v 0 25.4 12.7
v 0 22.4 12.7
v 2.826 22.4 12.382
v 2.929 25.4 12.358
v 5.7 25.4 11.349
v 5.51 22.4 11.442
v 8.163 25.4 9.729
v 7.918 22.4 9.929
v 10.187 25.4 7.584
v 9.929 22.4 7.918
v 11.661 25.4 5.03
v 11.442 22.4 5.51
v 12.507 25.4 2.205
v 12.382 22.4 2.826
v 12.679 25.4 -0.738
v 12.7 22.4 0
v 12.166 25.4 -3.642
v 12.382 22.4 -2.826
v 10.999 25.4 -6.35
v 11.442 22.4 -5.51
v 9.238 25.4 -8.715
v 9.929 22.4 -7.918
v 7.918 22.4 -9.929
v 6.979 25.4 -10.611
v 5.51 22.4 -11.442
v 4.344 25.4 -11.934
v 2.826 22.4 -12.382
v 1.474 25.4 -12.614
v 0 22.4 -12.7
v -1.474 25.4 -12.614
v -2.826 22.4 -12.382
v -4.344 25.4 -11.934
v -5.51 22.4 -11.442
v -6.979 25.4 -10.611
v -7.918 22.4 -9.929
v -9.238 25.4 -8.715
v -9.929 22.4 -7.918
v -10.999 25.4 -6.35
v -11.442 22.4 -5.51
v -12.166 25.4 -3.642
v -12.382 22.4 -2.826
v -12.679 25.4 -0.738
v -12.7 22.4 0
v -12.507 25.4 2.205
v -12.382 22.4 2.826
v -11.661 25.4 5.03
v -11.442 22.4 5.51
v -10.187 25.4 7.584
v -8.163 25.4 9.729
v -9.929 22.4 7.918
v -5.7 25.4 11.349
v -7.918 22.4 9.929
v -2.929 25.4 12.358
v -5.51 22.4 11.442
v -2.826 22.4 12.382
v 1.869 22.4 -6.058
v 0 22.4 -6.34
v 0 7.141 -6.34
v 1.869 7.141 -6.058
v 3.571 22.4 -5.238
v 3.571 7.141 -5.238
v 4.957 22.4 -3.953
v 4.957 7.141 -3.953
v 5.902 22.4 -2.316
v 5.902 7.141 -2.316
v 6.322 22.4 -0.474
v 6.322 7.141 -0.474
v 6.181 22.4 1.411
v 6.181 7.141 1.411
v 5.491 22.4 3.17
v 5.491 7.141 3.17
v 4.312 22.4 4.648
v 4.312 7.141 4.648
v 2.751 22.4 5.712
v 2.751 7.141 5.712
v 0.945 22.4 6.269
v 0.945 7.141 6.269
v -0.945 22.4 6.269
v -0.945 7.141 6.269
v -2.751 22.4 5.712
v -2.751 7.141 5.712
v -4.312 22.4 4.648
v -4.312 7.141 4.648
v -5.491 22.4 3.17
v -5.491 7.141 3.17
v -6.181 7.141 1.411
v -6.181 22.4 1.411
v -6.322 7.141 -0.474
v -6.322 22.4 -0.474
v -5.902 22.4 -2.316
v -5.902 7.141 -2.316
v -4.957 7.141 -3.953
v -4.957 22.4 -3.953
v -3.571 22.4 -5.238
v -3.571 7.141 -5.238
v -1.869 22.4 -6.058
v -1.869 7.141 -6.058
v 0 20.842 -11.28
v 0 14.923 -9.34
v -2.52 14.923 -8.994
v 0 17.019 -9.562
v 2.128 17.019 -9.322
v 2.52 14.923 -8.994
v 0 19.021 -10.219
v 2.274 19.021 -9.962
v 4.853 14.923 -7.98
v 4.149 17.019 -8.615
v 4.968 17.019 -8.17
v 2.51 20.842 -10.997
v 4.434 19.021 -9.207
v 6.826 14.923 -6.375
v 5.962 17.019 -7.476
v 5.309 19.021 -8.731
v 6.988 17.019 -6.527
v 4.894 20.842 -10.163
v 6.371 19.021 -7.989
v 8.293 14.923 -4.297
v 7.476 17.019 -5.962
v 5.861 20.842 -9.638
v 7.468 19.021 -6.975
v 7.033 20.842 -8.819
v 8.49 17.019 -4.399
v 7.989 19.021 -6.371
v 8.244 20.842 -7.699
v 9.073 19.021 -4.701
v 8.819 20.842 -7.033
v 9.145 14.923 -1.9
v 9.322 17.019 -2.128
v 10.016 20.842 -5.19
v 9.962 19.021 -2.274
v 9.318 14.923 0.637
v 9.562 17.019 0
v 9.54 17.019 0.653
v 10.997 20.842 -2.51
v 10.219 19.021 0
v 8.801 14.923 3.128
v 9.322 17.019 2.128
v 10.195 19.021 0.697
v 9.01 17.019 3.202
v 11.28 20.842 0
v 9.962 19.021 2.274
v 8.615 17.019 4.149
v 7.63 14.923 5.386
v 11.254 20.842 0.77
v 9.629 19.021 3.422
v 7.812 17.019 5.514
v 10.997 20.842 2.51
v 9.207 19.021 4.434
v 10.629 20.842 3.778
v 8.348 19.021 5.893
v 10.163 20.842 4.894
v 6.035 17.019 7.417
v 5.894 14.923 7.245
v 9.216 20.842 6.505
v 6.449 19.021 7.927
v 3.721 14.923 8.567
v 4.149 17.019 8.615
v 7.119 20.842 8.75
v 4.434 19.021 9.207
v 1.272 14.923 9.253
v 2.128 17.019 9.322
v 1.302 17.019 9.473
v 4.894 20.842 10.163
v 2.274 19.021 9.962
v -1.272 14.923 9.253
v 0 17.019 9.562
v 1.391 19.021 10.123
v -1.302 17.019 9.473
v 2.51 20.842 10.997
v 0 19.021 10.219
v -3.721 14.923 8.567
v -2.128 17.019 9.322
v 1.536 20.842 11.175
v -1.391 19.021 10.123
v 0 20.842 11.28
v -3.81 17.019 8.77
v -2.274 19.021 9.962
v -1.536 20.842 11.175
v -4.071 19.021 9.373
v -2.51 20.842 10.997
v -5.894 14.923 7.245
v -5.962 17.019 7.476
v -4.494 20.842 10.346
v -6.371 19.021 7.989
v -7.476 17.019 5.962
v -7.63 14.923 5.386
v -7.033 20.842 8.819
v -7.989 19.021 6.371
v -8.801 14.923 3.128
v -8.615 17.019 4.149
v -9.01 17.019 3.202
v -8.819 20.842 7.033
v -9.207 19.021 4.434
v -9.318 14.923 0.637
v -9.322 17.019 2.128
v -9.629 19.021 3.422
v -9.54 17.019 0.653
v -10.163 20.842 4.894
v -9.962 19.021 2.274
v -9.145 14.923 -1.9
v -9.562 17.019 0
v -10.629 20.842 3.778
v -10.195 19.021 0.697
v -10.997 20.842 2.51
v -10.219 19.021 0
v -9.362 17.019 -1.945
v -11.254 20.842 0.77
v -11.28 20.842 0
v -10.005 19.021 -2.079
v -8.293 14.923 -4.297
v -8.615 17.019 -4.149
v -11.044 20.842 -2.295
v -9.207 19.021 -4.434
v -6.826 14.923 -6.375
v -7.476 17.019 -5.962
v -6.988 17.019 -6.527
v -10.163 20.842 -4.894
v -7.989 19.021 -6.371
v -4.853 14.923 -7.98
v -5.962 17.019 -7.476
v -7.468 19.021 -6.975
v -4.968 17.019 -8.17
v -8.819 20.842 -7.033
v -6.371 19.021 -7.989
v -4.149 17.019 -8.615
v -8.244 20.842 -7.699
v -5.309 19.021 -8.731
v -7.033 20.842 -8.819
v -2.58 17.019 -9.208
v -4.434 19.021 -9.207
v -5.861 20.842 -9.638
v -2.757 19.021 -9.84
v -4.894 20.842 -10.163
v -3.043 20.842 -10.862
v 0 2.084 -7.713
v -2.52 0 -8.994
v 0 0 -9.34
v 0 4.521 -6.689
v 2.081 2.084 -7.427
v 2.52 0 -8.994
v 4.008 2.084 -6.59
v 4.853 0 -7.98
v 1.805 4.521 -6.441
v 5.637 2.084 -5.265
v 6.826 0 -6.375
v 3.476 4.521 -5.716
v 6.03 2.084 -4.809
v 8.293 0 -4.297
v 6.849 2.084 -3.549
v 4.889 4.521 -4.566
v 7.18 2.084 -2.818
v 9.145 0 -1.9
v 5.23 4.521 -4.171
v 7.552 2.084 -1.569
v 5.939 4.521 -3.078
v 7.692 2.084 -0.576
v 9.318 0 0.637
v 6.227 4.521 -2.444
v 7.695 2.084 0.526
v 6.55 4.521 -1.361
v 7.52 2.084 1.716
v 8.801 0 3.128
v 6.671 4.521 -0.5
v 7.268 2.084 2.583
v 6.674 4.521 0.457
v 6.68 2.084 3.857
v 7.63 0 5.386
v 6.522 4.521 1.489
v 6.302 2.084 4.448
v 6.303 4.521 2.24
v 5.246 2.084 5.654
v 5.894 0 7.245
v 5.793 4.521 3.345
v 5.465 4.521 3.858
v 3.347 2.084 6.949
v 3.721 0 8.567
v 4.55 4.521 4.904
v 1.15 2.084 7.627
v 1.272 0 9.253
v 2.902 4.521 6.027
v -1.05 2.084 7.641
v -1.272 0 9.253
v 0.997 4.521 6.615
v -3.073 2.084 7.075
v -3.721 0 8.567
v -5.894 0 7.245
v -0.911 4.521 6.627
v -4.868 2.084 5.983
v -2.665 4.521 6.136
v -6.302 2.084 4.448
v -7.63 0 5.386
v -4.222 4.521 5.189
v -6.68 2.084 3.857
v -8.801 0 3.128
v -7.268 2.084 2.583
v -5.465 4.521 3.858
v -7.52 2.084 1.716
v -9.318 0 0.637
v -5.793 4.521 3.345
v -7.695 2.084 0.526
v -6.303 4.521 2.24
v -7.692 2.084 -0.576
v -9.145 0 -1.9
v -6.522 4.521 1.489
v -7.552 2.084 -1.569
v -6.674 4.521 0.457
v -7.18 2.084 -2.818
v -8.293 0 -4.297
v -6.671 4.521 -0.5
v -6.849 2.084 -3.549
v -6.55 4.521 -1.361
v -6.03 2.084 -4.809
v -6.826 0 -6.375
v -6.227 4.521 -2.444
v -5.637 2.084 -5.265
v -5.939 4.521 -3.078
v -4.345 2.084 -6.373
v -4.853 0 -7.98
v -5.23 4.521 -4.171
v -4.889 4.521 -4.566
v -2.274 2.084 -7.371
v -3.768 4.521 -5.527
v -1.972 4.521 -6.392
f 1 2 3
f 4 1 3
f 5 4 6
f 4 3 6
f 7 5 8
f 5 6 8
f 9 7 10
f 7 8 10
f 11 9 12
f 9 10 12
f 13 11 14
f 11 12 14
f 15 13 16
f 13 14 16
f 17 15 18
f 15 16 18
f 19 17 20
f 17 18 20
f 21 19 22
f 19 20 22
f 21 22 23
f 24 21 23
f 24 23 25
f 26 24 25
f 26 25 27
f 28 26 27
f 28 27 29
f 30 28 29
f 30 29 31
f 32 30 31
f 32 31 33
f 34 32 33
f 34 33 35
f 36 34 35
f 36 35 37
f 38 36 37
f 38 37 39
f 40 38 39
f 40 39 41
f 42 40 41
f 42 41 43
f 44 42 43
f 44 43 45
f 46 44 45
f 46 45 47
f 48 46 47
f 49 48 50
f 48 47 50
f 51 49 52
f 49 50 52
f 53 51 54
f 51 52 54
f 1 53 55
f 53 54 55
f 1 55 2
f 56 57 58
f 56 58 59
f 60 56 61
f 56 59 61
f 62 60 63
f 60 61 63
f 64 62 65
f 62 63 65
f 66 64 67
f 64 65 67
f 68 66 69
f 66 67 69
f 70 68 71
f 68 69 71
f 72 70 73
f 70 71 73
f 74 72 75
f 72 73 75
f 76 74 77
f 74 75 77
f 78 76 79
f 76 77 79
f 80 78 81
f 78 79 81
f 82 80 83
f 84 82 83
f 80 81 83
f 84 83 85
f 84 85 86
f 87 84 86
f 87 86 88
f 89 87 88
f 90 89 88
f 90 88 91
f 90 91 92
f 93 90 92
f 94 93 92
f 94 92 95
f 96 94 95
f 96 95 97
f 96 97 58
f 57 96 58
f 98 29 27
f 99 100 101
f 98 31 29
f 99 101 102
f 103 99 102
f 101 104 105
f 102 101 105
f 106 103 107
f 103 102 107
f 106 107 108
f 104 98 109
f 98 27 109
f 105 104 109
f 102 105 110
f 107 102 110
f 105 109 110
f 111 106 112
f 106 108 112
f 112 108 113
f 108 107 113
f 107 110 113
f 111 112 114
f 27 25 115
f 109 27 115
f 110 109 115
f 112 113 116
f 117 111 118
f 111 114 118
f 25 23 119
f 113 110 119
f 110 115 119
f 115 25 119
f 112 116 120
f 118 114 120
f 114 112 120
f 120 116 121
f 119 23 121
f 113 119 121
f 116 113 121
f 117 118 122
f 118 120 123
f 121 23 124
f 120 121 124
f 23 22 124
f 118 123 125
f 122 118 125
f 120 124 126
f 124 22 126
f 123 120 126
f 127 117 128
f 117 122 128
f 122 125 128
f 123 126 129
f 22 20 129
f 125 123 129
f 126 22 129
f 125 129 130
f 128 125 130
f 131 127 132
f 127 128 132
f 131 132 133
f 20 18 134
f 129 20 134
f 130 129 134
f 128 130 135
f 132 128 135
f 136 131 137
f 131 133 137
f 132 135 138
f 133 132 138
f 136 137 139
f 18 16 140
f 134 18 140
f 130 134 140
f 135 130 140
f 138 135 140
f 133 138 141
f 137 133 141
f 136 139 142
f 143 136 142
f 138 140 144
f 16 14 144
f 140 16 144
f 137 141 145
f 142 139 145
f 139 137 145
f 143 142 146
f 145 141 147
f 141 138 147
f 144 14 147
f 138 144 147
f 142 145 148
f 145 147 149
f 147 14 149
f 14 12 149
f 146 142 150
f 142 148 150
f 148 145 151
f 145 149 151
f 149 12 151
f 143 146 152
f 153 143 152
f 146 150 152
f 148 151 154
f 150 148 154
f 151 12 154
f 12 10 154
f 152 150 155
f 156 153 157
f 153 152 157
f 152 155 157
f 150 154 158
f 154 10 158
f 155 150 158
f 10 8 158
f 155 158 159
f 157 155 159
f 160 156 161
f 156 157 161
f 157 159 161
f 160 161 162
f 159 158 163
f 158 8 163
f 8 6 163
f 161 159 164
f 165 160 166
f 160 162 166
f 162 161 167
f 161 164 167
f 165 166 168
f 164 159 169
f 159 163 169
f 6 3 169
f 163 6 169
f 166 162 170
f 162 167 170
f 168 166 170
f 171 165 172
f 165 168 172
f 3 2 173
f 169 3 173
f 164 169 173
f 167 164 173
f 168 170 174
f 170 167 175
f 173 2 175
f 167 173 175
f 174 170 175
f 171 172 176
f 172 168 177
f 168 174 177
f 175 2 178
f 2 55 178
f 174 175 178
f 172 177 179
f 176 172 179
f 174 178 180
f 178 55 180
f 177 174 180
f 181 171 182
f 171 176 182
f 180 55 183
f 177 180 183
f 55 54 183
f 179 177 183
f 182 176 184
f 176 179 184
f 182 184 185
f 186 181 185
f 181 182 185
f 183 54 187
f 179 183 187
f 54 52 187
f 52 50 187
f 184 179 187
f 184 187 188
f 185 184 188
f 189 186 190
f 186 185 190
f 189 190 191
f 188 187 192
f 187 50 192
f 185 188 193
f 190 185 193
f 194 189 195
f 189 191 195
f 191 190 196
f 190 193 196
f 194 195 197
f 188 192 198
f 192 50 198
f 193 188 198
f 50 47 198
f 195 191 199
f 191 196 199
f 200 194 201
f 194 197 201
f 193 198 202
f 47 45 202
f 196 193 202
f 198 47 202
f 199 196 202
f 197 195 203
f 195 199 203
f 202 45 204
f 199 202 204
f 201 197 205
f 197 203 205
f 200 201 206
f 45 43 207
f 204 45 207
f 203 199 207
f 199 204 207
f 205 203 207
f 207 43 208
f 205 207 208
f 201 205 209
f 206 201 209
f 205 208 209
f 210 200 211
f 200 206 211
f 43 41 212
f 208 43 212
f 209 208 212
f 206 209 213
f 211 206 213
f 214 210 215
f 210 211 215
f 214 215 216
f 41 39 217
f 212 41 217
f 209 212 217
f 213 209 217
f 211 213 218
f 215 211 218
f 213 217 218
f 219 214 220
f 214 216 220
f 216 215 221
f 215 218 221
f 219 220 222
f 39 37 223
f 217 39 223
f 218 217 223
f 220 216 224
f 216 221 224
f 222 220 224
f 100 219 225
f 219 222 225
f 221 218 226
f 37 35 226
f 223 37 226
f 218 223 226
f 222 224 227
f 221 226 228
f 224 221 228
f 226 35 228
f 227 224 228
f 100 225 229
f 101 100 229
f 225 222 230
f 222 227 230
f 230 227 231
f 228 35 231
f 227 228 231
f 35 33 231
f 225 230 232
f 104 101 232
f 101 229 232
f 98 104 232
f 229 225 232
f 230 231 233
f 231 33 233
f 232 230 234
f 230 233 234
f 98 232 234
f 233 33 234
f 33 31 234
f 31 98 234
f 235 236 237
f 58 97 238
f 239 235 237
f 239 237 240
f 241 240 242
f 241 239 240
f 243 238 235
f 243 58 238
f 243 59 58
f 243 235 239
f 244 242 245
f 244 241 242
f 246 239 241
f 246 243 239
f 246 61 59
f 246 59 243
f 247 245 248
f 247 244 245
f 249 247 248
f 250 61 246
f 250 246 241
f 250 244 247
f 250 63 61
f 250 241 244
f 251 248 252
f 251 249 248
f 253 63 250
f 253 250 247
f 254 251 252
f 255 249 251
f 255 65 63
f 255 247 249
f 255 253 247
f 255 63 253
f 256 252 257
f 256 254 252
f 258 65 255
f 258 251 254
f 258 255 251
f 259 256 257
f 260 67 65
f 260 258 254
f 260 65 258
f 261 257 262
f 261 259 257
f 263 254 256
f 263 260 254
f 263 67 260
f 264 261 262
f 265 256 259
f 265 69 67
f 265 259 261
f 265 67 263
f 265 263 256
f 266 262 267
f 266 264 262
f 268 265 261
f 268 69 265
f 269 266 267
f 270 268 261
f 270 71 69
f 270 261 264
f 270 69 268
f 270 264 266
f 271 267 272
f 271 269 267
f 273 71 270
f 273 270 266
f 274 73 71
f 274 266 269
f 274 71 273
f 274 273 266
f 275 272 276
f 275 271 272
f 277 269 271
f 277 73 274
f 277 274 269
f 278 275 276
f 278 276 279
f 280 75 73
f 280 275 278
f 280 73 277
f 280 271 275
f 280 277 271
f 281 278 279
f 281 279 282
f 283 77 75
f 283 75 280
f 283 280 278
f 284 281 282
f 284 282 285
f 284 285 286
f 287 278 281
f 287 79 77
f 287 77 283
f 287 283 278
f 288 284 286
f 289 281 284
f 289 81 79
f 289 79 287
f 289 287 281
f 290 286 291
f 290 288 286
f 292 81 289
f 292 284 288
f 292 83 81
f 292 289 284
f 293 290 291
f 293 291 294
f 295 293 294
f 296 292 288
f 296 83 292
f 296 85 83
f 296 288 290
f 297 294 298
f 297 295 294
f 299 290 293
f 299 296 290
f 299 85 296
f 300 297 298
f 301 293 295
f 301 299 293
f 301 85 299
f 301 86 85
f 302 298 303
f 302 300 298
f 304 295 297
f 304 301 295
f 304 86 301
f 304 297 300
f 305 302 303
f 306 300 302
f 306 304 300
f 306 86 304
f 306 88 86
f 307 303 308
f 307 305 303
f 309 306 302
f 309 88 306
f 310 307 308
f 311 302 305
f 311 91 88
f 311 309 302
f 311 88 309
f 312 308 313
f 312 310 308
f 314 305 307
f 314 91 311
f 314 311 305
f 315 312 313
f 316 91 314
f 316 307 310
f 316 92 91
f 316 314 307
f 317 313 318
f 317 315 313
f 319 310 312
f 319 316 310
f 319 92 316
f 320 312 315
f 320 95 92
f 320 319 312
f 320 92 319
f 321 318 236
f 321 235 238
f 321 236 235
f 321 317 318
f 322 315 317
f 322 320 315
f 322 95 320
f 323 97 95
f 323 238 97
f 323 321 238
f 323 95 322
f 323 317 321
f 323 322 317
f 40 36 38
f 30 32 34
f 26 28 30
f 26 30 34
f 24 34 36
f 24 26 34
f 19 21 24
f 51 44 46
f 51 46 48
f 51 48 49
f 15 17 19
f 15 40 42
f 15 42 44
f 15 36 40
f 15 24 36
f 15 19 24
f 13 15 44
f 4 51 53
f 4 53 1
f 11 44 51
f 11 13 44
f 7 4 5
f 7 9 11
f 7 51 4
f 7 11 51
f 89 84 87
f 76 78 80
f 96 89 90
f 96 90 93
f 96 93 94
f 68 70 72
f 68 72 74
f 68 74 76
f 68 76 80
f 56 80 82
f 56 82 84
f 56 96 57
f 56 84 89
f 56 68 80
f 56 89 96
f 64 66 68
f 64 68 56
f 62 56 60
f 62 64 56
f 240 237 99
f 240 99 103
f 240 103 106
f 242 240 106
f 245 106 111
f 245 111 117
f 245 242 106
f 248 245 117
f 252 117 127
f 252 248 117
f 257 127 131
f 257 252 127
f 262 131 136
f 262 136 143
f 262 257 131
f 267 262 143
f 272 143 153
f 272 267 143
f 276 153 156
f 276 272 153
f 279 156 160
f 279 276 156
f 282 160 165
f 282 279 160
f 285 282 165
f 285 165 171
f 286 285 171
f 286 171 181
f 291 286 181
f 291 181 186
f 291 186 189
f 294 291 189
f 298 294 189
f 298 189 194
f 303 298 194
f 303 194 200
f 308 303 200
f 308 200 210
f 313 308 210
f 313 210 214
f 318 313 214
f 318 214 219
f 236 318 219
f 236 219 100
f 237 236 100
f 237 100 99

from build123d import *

# Parameters (mm, degrees)
SKETCH1_R           = 12.699999999999998
BOSS_EXTRUDE1_DEPTH = 25.4
SKETCH2_R           = 6.34
CUT_EXTRUDE1_DEPTH  = 22.4
SKETCH3_R           = 12.7
SKETCH3_R_2         = 9.340000000000002
CUT_EXTRUDE4_DEPTH  = 22.4
FILLET1_R           = 10


with BuildPart() as part:
    # Sketch1 → Boss-Extrude1 (new body)
    with BuildSketch(Plane(origin=(0, 0, 0), x_dir=(1, 0, 0), z_dir=(0, 1, 0))):
        with Locations(Location((0, 0, 0), (0, 0, 270))):
            Circle(SKETCH1_R)
    extrude(amount=BOSS_EXTRUDE1_DEPTH)

    # Sketch2 → Cut-Extrude1 (cut)
    with BuildSketch(Plane.XZ):
        with Locations(Location((0, 0, 0), (0, 0, 270))):
            Circle(SKETCH2_R)
    extrude(amount=-CUT_EXTRUDE1_DEPTH, mode=Mode.SUBTRACT)

    # Sketch3 → Cut-Extrude4 (cut)
    with BuildSketch(Plane.XZ):
        with Locations(Location((0, 0, 0), (0, 0, 90))):
            Circle(SKETCH3_R)
        with Locations(Location((0, 0, 0), (0, 0, 270))):
            Circle(SKETCH3_R_2, mode=Mode.SUBTRACT)
    extrude(amount=-CUT_EXTRUDE4_DEPTH, mode=Mode.SUBTRACT)

    # Fillet1
    # the kernel refuses this fillet: 10 mm, written as the material it adds along each edge
    with BuildSketch(Plane(origin=(0, 22.4, 0), x_dir=(-1.8e-16, 0, -1), z_dir=(-1, 0, 1.8e-16))) as fillet1_piece_1:
        with BuildLine():
            CenterArc((19.340000000000003, 7.477325725150667), FILLET1_R, 180, 48.39434621608348)
            Line((9.340000000000003, 7.477325725150667), (9.140000000000004, 7.477325725150667))
            Line((9.140000000000004, 7.477325725150667), (9.140000000000002, 0))
            Line((9.140000000000002, 0), (9.340000000000002, -0.1999999999999993))
            ThreePointArc((9.340000000000002, -0.1999999999999993), (11.02, -0.1999999999999993), (12.5672, -0.1495465145030117))
            Line((12.5672, -0.1495465145030117), (12.7, 0))
        make_face()
    revolve(axis=Axis((0, 22.4, 0), (0, -1, 0)))
    # the kernel refuses this fillet: 10 mm, written as the material it takes off along each edge
    with BuildSketch(Plane(origin=(0, 0, 0), x_dir=(-1.8e-16, 0, -1), z_dir=(-1, 0, 1.8e-16))) as fillet1_2_piece_1:
        with BuildLine():
            CenterArc((16.339999999999996, -7.141428428542857), FILLET1_R, 134.42700400080568, 45.57299599919432)
            Line((6.339999999999996, -7.141428428542857), (6.139999999999996, -7.141428428542857))
            Line((6.139999999999996, -7.141428428542857), (6.14, 0))
            Line((6.14, 0), (6.34, 0.2))
            ThreePointArc((6.34, 0.2), (7.840000000000001, 0.2), (9.200000000000001, 0.14282856857085713))
            Line((9.200000000000001, 0.14282856857085713), (9.340000000000002, 0))
        make_face()
    revolve(axis=Axis((0, 0, 0), (0, -1, 0)), mode=Mode.SUBTRACT)


solid = part.part
